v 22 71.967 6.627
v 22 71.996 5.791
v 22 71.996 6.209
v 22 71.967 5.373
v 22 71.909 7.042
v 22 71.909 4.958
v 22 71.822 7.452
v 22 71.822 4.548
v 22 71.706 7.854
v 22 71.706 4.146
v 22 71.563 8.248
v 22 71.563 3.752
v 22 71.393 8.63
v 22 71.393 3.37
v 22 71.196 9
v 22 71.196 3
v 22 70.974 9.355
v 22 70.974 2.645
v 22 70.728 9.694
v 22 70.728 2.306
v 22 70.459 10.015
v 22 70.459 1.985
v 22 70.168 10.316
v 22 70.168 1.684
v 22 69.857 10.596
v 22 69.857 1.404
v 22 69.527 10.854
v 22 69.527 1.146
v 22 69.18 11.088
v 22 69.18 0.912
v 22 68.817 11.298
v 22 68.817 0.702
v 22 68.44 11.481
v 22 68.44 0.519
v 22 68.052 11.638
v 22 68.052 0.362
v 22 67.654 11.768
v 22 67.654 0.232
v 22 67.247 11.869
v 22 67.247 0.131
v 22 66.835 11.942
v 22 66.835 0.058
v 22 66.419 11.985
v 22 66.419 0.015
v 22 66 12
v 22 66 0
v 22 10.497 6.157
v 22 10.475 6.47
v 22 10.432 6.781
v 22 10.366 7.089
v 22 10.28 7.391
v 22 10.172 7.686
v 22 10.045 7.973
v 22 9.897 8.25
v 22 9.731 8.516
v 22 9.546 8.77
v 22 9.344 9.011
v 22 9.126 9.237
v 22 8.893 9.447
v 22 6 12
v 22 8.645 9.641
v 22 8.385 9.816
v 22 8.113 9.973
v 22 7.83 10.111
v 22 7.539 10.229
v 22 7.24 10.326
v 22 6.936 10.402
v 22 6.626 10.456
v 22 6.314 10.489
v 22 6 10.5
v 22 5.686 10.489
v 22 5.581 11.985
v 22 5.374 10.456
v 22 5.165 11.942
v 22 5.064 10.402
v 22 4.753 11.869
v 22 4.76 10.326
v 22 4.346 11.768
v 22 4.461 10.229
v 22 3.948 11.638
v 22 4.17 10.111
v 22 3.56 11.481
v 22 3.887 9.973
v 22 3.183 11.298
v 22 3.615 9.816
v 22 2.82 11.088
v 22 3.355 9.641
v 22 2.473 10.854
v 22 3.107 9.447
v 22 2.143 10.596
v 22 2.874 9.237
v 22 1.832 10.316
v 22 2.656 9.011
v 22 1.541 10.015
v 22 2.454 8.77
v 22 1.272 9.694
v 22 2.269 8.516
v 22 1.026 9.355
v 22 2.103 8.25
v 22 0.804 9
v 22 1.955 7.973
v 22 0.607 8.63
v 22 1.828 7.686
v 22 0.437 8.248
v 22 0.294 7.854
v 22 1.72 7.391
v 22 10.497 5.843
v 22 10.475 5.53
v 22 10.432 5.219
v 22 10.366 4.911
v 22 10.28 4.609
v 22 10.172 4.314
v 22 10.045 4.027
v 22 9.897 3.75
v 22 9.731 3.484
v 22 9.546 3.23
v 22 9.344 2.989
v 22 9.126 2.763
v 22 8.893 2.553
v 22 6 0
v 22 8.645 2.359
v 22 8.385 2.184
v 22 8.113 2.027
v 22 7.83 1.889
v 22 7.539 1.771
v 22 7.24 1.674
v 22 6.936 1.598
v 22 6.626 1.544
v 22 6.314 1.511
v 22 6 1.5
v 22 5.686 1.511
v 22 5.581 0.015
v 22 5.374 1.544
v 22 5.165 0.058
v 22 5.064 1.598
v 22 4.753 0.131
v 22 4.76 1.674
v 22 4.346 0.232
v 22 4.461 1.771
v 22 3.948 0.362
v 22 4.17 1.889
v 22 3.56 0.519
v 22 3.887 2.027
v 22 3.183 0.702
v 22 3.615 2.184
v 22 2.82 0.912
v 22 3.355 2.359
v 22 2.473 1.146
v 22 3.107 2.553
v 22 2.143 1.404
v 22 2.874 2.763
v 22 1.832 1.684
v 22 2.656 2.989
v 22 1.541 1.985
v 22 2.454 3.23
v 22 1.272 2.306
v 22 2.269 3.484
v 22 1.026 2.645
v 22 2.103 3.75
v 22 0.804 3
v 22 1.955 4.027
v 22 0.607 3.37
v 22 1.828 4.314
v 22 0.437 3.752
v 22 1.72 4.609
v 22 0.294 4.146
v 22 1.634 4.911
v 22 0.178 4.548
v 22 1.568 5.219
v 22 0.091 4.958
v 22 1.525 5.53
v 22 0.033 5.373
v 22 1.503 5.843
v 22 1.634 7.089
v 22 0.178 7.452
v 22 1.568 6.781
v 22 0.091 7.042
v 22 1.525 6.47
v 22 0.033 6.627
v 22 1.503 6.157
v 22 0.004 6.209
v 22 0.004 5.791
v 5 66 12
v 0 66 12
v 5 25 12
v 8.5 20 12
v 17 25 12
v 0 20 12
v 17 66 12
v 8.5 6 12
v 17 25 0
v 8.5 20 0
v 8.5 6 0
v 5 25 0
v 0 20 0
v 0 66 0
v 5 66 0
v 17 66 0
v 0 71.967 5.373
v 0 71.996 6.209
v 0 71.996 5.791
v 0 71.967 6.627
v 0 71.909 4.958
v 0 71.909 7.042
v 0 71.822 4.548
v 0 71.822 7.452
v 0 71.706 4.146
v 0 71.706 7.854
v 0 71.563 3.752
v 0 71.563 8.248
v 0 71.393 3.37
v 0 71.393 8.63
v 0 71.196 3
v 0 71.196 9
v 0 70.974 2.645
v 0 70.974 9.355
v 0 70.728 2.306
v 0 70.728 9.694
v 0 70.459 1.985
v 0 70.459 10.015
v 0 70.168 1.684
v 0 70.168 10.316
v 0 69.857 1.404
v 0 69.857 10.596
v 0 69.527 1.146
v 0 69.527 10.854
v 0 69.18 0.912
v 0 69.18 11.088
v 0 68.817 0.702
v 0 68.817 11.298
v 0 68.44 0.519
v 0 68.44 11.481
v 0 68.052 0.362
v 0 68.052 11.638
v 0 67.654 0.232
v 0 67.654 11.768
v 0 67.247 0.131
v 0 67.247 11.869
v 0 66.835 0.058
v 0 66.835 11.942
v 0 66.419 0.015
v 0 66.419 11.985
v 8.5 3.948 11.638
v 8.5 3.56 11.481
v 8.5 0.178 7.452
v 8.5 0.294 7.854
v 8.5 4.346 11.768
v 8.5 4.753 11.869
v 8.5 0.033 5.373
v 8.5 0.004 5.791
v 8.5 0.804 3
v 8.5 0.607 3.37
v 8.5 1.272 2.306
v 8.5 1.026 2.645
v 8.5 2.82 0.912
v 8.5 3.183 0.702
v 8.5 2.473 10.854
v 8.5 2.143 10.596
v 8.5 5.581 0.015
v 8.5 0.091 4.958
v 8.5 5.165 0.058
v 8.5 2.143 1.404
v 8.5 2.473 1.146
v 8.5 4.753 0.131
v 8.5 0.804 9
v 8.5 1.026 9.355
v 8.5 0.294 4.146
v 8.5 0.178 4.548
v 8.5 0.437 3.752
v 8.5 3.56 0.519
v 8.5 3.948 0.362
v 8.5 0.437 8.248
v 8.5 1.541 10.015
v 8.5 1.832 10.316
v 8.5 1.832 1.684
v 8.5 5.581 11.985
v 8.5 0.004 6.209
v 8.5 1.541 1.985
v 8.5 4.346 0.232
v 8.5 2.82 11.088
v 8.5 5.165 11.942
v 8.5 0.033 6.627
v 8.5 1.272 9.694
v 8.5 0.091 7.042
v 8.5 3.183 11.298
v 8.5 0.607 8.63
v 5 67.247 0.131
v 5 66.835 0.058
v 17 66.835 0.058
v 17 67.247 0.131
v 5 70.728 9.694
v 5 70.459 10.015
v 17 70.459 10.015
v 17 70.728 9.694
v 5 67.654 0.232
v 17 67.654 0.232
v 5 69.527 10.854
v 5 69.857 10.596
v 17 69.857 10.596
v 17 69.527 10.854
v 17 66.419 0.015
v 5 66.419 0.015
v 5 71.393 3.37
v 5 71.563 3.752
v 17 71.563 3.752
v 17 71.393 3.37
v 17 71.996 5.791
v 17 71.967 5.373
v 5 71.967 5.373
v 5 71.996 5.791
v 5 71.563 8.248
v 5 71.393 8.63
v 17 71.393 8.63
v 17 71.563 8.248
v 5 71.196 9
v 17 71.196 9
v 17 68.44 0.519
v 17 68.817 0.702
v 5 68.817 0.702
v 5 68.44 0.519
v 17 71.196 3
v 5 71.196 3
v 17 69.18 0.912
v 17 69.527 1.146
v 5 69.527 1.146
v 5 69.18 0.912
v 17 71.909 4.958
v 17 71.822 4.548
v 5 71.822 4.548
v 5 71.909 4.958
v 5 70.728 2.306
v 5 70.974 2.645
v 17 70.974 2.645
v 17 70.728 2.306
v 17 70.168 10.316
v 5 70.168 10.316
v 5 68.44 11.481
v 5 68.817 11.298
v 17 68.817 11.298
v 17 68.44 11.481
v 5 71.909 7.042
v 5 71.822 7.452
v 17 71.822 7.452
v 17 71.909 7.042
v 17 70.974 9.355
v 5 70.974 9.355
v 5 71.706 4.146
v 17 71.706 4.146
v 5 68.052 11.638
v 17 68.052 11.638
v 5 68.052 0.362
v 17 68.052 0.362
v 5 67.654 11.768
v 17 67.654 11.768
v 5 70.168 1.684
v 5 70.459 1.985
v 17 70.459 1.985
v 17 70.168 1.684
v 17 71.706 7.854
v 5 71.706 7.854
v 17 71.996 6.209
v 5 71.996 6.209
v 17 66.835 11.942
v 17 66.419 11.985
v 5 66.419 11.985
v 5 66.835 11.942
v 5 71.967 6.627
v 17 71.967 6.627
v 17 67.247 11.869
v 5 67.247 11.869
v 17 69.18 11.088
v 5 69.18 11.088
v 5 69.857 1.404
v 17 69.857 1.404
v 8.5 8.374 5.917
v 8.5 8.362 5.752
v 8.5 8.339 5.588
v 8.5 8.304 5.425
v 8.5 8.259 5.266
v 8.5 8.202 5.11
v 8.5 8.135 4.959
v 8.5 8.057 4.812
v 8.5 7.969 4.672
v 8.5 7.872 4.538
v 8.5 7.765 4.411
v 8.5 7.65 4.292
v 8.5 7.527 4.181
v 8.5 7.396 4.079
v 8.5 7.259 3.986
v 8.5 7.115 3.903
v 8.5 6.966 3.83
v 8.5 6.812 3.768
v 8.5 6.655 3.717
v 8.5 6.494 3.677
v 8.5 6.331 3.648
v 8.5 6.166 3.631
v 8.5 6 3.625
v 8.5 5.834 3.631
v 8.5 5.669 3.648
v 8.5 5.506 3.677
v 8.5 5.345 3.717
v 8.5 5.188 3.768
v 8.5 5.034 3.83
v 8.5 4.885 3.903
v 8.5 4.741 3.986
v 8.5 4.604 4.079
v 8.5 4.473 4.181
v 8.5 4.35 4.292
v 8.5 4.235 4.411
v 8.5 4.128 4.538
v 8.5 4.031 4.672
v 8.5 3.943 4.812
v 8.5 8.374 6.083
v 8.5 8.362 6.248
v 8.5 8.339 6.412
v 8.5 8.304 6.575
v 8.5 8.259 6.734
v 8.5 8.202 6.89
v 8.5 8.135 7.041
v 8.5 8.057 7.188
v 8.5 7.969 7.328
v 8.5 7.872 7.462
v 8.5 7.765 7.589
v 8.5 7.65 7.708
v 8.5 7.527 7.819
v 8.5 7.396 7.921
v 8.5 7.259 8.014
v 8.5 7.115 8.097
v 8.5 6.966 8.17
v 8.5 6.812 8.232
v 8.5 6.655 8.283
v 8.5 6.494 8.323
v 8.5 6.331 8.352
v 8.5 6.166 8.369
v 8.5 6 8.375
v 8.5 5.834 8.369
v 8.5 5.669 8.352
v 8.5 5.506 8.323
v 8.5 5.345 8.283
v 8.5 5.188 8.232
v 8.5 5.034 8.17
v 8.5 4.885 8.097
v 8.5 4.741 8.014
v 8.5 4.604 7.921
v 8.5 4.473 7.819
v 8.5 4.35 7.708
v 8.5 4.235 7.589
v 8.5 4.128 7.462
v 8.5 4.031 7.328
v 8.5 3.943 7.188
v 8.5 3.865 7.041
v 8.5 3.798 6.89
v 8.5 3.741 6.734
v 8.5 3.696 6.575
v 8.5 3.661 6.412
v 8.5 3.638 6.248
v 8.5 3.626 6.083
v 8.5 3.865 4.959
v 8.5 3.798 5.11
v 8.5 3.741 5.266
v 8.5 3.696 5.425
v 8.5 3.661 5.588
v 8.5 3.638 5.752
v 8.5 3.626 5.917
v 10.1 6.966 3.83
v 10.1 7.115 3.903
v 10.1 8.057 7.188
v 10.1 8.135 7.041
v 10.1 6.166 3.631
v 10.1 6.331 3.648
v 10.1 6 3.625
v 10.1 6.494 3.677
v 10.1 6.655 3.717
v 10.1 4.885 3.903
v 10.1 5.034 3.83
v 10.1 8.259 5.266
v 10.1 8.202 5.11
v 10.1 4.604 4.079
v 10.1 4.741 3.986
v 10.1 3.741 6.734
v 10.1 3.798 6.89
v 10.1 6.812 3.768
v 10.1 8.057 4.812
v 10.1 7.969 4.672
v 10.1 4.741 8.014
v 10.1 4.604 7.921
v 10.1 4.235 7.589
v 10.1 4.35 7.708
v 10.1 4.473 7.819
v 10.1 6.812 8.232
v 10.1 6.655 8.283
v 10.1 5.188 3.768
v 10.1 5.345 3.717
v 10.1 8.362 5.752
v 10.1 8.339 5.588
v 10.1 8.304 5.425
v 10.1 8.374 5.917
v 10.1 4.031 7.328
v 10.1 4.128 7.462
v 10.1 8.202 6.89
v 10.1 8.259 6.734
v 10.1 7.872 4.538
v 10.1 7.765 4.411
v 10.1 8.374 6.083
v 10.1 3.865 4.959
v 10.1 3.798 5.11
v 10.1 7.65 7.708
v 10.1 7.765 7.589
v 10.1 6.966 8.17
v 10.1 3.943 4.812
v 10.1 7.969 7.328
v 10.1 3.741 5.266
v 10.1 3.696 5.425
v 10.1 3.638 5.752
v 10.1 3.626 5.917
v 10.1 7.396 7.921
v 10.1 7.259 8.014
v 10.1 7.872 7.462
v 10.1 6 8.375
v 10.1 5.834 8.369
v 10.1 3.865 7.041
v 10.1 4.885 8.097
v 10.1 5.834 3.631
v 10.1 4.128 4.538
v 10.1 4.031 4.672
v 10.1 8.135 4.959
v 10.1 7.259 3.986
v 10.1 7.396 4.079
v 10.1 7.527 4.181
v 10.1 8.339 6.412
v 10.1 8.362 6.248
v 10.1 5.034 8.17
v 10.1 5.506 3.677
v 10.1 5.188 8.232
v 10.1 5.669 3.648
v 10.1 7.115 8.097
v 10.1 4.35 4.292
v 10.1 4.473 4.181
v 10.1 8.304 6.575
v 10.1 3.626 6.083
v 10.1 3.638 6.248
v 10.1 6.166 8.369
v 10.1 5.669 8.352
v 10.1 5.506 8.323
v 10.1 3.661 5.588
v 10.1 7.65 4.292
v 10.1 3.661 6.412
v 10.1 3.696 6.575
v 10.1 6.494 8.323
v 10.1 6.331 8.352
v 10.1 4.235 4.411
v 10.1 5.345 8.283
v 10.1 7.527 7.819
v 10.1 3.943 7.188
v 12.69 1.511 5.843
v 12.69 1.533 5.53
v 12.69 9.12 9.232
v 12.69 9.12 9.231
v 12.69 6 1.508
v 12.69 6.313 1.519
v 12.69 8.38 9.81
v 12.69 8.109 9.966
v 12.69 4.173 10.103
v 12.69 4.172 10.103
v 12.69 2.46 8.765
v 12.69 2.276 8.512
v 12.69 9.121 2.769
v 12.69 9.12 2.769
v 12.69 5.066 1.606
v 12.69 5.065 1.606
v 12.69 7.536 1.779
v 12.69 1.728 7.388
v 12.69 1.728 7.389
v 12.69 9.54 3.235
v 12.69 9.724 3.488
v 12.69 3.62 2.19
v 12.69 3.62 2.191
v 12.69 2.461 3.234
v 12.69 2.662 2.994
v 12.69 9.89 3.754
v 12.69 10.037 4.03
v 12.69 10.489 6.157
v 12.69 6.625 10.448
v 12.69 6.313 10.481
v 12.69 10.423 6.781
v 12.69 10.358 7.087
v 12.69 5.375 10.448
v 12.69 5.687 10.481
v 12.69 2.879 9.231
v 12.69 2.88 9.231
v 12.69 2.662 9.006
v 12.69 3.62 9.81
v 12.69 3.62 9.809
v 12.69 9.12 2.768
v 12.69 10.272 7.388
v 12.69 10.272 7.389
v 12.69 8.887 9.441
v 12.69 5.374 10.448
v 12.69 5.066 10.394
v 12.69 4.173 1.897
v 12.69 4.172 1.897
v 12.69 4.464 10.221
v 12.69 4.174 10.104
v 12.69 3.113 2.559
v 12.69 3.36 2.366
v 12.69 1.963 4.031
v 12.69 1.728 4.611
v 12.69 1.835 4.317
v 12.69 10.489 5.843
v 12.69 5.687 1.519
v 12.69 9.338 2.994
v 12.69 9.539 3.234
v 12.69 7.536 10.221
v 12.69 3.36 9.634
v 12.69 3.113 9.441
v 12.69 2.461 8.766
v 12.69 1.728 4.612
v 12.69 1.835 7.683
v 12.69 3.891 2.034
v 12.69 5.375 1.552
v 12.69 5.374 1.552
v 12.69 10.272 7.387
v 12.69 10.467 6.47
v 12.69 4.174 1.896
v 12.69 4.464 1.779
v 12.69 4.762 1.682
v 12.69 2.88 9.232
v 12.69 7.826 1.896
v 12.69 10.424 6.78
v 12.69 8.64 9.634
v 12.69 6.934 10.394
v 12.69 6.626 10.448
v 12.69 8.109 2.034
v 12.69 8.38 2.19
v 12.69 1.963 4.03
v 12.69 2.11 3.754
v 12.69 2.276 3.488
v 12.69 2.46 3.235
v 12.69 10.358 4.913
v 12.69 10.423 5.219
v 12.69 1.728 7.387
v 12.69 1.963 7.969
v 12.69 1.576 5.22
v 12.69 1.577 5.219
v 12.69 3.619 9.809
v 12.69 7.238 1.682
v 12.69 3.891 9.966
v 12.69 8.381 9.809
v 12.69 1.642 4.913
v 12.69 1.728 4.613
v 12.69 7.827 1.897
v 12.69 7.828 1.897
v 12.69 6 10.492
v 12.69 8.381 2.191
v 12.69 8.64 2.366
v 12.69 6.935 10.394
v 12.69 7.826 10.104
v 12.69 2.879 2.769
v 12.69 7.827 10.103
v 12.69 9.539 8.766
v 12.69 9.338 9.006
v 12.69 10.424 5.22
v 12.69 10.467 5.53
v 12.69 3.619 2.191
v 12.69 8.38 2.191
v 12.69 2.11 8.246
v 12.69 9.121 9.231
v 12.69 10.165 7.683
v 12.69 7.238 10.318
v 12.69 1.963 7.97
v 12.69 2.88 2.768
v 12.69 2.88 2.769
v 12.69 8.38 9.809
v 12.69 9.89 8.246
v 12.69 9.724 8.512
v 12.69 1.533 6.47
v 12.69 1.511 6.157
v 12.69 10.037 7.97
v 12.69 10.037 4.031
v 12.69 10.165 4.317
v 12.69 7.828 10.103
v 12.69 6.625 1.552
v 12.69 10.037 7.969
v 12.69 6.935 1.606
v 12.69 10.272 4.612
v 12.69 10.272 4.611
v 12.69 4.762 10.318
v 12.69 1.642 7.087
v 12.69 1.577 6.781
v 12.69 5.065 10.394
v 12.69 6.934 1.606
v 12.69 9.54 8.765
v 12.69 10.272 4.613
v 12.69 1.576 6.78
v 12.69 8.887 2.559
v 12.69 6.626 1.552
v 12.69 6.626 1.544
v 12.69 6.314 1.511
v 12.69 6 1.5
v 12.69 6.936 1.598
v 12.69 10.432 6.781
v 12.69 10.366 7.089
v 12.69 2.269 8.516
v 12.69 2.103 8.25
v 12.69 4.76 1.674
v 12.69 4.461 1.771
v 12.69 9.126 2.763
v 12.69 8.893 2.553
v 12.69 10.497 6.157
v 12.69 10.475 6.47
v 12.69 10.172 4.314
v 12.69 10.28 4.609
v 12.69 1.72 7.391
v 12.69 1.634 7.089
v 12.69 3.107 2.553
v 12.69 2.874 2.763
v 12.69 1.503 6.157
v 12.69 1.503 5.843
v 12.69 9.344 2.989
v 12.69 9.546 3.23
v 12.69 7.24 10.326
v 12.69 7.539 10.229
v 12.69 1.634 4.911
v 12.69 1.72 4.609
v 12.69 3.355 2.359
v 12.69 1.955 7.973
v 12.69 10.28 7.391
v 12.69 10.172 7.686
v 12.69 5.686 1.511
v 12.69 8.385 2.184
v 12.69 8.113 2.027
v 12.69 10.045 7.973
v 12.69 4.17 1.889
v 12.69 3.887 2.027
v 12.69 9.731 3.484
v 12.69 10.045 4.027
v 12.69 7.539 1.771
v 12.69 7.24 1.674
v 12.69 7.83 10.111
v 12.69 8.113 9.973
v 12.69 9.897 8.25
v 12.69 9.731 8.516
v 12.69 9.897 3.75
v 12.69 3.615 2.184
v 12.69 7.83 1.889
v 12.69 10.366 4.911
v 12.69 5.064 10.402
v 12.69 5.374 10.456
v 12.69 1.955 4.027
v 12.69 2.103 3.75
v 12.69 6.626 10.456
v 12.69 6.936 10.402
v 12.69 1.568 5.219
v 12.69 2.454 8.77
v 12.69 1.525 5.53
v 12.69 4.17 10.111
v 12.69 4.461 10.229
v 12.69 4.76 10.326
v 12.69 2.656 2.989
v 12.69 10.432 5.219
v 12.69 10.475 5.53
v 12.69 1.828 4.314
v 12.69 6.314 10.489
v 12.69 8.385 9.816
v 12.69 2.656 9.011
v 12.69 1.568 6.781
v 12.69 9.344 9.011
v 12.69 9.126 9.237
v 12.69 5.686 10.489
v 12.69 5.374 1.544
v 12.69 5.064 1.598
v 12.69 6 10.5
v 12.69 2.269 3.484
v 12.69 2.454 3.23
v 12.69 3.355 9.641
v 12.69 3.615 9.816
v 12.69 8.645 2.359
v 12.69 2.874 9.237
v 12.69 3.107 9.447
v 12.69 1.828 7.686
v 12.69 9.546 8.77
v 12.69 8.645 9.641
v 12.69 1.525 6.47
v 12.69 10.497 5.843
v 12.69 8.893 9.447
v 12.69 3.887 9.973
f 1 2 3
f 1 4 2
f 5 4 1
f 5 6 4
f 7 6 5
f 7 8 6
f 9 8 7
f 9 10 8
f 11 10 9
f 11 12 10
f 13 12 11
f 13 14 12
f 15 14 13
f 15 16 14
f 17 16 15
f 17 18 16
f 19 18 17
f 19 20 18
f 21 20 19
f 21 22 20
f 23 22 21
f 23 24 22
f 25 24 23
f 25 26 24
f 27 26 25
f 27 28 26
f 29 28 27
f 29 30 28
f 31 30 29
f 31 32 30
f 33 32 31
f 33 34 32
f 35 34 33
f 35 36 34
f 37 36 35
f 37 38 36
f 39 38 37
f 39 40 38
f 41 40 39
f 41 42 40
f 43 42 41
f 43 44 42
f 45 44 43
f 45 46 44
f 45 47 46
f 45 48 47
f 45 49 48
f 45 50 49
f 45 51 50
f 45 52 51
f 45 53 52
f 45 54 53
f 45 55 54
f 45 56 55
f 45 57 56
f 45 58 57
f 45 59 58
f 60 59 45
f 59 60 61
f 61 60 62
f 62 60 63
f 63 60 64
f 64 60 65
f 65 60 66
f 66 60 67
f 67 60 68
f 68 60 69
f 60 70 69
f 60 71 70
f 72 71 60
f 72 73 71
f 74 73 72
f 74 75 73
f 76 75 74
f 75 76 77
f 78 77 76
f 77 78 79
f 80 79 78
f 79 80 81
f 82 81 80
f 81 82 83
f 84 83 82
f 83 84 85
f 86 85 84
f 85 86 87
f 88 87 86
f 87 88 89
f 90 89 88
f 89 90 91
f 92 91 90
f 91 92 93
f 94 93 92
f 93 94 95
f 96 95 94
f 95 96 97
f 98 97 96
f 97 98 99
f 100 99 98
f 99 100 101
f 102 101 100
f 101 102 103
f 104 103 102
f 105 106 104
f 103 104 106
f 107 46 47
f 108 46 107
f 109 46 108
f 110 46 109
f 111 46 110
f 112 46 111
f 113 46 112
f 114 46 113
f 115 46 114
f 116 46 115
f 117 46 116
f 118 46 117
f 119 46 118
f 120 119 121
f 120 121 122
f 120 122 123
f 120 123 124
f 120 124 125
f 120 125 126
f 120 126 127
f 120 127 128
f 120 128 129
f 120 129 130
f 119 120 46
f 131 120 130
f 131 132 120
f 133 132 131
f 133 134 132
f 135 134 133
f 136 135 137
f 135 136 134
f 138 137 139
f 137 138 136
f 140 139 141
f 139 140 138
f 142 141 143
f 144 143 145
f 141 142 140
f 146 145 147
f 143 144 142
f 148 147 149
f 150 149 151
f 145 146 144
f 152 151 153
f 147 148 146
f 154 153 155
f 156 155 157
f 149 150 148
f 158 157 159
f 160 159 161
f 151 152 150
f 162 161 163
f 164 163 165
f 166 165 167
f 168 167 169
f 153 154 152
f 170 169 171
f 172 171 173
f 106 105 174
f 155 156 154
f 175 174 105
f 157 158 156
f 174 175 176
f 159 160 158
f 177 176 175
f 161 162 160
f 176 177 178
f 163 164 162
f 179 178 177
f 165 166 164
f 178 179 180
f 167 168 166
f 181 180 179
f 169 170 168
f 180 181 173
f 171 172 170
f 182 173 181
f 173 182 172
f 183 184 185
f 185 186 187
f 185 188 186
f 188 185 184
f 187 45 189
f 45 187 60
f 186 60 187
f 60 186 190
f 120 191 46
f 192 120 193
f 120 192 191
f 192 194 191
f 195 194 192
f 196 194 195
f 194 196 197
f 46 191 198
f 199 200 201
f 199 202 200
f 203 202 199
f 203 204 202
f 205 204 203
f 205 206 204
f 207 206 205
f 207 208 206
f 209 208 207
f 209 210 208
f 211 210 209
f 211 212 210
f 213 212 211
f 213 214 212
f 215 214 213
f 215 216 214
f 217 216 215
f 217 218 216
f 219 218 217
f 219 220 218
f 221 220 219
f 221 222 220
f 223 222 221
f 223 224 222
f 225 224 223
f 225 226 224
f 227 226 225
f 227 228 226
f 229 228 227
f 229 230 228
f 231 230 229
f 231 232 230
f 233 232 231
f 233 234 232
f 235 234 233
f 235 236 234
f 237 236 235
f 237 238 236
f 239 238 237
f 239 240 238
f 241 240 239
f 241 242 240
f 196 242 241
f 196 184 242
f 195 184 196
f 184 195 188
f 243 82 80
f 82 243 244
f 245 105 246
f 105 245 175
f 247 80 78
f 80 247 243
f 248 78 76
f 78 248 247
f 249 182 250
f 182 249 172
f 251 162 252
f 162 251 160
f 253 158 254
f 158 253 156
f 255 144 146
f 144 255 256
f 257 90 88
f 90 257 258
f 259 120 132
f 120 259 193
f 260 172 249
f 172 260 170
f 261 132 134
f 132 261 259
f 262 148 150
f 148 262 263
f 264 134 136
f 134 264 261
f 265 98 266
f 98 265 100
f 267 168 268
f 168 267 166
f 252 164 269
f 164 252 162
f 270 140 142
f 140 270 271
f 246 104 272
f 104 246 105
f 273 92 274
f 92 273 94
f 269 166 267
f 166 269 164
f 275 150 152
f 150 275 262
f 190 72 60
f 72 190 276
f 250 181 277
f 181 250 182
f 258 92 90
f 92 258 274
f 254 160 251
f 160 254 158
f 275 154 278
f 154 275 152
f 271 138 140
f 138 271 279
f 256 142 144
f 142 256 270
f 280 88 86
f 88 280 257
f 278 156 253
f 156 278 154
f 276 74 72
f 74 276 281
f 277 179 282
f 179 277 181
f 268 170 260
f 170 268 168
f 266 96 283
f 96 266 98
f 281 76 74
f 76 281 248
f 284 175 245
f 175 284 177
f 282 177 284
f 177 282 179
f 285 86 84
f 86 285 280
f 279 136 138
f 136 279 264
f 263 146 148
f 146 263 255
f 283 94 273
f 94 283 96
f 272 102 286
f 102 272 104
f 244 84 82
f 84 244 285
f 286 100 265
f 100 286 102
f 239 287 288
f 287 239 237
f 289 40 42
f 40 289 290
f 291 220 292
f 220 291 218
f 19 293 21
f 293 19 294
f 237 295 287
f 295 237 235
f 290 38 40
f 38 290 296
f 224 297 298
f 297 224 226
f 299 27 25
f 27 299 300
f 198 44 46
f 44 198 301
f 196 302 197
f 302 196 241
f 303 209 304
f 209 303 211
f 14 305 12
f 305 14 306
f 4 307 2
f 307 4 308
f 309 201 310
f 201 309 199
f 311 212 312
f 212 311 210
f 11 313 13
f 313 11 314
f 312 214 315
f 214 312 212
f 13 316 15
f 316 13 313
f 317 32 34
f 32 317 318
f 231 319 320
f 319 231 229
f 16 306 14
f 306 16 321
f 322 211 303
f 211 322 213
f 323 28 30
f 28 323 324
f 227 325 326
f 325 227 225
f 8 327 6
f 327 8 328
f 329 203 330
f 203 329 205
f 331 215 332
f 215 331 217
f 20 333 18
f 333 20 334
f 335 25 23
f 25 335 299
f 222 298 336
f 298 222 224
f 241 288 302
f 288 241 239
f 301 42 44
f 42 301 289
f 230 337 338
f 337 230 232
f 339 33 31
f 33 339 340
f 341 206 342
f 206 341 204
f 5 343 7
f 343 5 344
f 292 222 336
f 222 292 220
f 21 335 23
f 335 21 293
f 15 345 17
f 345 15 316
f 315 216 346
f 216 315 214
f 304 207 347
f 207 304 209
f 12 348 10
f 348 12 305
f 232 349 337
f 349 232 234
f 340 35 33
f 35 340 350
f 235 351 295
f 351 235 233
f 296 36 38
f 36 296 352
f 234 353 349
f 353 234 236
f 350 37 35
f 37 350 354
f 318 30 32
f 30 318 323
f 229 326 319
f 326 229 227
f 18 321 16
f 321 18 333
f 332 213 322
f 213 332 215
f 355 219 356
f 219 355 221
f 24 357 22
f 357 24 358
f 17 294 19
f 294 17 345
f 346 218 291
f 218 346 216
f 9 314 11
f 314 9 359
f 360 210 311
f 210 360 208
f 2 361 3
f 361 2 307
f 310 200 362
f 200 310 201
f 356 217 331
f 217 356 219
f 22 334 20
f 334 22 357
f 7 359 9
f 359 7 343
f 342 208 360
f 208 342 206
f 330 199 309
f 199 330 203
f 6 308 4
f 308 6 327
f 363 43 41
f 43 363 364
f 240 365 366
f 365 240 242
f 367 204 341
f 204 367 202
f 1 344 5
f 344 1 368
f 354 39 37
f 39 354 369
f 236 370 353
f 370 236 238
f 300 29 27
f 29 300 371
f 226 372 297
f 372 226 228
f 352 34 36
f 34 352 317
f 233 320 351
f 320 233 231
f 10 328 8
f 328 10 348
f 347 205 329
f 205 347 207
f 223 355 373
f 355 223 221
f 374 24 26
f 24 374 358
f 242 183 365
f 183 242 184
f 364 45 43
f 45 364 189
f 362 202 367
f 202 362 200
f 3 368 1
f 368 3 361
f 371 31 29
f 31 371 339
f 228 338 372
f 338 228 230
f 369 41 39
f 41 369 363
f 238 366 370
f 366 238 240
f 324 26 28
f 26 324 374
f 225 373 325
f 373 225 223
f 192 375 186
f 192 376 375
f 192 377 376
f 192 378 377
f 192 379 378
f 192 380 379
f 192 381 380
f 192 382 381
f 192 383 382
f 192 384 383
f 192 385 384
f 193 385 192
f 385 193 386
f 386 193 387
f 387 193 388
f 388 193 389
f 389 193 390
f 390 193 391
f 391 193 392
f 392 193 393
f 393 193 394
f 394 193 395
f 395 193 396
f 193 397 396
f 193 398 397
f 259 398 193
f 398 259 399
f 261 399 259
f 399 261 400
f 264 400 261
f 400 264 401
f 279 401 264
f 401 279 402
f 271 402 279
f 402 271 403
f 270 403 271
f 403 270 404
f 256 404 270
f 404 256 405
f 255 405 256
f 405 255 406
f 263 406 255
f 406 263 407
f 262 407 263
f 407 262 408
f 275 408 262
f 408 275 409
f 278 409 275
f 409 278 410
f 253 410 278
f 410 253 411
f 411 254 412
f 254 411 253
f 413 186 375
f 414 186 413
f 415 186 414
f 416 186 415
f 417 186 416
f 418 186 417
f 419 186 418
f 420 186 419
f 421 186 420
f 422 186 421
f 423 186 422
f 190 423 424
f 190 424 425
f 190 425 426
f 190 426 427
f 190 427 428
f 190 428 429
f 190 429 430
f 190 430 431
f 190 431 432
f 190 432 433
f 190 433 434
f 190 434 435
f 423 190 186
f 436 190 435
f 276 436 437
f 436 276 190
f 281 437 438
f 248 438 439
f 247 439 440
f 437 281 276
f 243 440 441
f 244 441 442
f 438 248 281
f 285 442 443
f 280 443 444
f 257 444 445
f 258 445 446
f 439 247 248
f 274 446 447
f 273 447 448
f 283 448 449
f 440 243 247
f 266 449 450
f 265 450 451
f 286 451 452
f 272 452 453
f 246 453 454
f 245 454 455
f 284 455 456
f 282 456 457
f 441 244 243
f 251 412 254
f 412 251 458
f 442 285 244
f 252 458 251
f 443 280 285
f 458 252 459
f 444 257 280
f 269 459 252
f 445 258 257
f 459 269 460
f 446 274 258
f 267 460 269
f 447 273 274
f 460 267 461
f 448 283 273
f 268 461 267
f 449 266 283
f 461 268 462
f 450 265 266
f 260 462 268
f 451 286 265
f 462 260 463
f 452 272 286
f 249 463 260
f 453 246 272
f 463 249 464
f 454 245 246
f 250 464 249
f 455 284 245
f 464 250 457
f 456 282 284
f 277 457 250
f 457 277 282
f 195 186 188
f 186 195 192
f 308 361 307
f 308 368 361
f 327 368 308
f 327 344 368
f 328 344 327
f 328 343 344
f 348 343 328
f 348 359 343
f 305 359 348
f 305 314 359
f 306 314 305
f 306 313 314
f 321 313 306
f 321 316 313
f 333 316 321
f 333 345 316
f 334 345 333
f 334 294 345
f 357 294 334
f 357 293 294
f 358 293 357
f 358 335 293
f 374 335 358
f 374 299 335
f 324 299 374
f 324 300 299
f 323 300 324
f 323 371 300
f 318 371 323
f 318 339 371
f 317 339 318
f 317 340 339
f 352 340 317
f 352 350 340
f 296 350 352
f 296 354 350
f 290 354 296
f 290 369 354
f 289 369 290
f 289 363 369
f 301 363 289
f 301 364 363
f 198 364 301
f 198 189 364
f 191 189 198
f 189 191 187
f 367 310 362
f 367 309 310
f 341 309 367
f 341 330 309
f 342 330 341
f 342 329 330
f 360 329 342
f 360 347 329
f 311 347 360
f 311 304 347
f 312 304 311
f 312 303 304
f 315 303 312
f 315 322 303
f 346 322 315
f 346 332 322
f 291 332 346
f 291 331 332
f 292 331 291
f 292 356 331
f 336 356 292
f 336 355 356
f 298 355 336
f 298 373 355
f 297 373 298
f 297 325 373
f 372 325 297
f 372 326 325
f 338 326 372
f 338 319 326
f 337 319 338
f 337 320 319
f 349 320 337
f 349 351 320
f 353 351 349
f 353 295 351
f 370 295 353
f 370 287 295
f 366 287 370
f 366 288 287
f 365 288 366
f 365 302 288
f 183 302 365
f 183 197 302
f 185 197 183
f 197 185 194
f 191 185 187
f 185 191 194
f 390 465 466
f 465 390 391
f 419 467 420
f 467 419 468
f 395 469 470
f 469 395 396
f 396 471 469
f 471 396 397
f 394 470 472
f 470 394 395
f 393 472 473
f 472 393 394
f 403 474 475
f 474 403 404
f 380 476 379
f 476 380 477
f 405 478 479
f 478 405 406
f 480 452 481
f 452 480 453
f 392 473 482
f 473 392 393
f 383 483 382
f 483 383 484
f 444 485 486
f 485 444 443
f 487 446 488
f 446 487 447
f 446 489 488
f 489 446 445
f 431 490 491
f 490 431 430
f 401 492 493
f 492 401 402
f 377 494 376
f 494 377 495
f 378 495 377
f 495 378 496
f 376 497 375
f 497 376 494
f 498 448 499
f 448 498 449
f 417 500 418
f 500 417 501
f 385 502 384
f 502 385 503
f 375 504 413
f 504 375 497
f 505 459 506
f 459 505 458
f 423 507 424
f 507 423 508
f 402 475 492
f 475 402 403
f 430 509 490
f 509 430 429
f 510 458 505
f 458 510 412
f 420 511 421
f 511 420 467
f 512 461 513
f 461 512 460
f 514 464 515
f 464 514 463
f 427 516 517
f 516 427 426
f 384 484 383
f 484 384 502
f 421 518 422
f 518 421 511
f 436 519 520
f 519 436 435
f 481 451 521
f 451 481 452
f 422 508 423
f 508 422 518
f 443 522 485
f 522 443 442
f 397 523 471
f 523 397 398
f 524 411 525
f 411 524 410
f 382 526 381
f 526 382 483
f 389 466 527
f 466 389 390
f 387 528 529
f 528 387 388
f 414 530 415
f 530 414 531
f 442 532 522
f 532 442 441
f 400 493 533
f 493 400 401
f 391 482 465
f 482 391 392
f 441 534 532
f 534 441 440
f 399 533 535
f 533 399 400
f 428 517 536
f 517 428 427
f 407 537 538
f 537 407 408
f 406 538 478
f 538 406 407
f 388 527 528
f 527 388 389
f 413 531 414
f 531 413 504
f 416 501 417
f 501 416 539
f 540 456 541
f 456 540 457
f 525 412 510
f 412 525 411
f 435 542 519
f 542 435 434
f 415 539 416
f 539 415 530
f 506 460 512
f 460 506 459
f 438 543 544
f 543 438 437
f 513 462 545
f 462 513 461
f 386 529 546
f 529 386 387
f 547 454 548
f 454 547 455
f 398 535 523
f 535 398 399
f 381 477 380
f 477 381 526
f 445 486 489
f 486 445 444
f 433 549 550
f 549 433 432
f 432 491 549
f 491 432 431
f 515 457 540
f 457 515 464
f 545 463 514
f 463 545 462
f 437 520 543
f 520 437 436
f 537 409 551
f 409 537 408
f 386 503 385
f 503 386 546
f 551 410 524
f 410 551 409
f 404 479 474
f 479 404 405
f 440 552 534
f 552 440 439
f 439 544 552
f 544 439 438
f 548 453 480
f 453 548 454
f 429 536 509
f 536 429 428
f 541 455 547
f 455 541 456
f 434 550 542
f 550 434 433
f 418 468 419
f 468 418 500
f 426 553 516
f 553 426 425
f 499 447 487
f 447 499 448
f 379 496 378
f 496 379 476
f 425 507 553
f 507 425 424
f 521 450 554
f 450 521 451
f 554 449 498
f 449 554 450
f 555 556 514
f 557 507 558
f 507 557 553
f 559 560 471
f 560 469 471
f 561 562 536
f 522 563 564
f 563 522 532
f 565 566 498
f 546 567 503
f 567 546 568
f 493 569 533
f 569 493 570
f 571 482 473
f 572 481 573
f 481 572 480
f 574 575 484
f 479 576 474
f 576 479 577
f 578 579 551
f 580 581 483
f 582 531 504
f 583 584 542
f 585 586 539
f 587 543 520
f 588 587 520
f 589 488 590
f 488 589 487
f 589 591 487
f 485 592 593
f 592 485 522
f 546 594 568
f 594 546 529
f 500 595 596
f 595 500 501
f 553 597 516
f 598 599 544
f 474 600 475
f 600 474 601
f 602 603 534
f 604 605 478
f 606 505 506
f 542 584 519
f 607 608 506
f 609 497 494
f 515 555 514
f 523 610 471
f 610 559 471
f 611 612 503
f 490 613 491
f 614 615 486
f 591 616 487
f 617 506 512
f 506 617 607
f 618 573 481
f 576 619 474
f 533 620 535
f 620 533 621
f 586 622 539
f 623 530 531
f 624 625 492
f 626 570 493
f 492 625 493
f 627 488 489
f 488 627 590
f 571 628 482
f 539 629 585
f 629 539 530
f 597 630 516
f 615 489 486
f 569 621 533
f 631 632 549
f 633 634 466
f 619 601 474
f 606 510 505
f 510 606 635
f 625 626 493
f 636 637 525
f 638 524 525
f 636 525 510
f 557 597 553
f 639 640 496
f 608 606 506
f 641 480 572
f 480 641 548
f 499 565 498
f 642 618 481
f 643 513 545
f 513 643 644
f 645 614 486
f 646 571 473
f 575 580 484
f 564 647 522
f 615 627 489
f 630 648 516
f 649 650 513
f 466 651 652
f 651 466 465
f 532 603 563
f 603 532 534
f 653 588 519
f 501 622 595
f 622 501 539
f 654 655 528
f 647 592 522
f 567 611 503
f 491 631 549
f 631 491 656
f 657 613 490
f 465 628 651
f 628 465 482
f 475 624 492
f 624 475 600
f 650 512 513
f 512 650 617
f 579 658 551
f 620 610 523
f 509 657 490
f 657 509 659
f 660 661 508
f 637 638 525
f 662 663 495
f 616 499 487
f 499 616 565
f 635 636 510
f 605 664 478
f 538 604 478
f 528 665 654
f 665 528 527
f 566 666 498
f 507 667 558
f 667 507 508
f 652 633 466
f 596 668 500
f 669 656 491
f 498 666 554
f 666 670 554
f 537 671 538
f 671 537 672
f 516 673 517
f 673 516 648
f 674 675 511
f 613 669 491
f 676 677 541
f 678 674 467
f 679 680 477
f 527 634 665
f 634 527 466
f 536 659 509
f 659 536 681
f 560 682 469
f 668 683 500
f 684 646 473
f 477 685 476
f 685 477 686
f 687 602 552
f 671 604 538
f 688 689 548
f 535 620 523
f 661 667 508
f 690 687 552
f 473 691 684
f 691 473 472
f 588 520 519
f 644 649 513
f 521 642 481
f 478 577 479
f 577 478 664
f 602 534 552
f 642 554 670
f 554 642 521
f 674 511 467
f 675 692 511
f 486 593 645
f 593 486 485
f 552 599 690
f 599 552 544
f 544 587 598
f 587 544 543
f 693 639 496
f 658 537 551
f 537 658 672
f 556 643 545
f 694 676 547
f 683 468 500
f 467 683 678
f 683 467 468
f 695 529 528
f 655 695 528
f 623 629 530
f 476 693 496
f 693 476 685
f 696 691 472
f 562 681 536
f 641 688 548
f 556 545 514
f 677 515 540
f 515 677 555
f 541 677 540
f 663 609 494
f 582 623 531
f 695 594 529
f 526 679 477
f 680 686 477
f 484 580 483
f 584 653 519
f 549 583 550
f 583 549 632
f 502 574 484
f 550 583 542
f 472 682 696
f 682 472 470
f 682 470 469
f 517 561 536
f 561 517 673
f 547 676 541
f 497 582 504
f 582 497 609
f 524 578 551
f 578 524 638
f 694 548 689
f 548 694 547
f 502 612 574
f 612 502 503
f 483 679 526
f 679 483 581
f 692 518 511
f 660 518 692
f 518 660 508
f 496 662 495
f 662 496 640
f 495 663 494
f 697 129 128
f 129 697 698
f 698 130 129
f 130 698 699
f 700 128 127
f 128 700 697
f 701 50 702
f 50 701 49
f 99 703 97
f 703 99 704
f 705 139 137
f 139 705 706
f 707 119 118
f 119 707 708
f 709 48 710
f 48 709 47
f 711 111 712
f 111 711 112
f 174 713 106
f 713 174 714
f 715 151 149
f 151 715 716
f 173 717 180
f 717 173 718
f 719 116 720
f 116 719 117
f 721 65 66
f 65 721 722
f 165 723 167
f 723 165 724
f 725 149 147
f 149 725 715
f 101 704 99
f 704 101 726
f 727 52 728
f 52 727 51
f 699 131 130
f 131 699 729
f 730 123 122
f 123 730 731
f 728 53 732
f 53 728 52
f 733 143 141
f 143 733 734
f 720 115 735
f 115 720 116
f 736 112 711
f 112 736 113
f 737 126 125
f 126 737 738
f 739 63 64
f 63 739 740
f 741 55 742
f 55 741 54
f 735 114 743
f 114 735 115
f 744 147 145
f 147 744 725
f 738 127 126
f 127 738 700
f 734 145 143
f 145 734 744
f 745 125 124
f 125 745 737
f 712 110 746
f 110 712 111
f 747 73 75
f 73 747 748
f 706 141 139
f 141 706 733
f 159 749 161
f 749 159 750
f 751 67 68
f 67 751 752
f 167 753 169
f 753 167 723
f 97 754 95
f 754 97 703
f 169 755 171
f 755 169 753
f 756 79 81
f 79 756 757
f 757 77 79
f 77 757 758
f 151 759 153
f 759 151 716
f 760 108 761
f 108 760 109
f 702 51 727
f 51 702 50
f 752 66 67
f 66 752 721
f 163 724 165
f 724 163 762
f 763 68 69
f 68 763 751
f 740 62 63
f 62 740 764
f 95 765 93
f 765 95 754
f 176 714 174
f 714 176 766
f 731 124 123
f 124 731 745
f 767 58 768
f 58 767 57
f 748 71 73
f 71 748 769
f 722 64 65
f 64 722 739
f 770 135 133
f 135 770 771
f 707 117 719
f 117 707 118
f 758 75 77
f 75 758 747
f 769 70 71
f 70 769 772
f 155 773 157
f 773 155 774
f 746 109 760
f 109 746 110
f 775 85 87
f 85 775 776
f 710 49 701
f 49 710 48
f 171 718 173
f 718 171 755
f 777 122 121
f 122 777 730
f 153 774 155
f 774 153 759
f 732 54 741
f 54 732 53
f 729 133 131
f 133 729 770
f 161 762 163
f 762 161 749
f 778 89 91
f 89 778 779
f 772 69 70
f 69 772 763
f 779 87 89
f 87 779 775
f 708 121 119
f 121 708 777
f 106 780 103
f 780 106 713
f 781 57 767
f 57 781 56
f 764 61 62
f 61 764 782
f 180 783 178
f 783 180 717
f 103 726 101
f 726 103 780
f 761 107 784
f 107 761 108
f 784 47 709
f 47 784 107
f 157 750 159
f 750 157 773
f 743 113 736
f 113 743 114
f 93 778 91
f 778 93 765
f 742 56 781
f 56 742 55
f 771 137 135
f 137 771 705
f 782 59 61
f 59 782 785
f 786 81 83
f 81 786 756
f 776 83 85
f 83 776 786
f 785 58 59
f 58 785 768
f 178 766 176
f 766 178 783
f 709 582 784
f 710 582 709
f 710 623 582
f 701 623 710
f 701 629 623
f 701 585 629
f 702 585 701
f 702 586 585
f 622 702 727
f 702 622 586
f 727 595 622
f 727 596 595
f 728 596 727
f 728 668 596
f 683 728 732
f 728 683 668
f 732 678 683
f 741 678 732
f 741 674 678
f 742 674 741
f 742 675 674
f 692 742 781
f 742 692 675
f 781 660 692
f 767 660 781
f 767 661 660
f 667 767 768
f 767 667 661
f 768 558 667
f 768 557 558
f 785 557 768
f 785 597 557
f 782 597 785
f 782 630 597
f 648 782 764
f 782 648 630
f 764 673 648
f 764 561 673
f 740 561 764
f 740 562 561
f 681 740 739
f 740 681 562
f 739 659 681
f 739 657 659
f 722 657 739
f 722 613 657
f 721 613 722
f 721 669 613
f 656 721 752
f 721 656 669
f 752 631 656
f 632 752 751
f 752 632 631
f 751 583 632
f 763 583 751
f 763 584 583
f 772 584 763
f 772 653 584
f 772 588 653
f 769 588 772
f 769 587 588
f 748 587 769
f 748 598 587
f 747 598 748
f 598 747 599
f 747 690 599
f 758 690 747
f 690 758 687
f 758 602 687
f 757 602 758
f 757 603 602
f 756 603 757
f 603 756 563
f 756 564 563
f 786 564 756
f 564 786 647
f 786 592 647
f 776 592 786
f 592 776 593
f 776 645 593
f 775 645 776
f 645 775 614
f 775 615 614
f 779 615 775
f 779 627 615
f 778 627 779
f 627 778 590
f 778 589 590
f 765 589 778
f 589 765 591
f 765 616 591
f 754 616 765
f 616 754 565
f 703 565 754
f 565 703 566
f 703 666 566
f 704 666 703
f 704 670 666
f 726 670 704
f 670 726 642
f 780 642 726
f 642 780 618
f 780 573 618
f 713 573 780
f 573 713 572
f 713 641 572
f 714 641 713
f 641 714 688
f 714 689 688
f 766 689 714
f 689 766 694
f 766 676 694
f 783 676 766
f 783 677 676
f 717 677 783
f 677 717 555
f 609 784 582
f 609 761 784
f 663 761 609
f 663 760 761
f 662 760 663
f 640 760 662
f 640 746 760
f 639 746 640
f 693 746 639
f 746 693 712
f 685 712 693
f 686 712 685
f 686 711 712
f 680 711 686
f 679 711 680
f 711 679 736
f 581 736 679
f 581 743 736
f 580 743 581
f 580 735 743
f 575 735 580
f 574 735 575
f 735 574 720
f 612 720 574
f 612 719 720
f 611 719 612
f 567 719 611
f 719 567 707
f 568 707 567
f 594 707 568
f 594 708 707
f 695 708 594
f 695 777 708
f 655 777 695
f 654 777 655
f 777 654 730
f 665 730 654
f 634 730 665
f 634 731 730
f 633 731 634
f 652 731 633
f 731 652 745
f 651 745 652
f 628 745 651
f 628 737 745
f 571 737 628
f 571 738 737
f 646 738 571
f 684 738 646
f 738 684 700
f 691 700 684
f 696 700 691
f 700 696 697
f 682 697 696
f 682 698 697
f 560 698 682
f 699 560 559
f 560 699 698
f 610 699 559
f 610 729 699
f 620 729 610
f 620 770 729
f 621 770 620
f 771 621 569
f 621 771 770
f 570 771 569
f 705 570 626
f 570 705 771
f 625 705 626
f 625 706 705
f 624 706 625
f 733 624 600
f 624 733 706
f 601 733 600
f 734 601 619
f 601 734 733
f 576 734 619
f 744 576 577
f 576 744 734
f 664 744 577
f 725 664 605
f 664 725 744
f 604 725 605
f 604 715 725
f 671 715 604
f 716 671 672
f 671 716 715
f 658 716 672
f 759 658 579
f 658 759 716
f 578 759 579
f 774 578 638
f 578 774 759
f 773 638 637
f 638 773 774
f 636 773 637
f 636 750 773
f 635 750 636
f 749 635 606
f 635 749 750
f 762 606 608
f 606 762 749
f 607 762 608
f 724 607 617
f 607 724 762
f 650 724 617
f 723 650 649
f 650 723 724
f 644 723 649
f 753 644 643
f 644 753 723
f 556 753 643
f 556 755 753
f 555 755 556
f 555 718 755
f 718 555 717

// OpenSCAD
$fa=4; // default minimum facet angle is now 0.5
$fs=0.05; // default minimum facet size is now 0.05 mm

screwHoleDiam = 4.75;
countersinkDiam = 9;

difference() {
  union() {
    translate([0, 6, 0]) cube([22, 60, 12]);
    translate([0, 6, 6]) rotate([0, 90, 0]) cylinder(r = 6, h = 22);
    translate([0, 66, 6]) rotate([0, 90, 0]) cylinder(r = 6, h = 22);
  }

  translate([0, 0, -.1]) {
    translate([-.1, -.1, 0]) cube([8.6, 20.1, 12.2]);
    translate([5, 25, 0]) cube([12, 50.1, 12.2]);  
  }

  #translate([2.5, 6, 6]) {
    rotate([0, 90, 0]) chamferedScrewHole(countersinkDiam / 2, screwHoleDiam / 2, 5 * 2, 5 / 2);
  }
}


module chamferedScrewHole(rh, rs, d, ds, t = .1, holeDepth = 15) {
  translate([0, 0, -t]) cylinder(r=rs, h=d + t);
  translate([0, 0, d - ds + t]) cylinder(r1=rs, r2=rh, h=ds + t);
  translate([0, 0, d - ds + 2*t + ds - .01]) cylinder(r=rh, h=ds + t + holeDepth);
}
